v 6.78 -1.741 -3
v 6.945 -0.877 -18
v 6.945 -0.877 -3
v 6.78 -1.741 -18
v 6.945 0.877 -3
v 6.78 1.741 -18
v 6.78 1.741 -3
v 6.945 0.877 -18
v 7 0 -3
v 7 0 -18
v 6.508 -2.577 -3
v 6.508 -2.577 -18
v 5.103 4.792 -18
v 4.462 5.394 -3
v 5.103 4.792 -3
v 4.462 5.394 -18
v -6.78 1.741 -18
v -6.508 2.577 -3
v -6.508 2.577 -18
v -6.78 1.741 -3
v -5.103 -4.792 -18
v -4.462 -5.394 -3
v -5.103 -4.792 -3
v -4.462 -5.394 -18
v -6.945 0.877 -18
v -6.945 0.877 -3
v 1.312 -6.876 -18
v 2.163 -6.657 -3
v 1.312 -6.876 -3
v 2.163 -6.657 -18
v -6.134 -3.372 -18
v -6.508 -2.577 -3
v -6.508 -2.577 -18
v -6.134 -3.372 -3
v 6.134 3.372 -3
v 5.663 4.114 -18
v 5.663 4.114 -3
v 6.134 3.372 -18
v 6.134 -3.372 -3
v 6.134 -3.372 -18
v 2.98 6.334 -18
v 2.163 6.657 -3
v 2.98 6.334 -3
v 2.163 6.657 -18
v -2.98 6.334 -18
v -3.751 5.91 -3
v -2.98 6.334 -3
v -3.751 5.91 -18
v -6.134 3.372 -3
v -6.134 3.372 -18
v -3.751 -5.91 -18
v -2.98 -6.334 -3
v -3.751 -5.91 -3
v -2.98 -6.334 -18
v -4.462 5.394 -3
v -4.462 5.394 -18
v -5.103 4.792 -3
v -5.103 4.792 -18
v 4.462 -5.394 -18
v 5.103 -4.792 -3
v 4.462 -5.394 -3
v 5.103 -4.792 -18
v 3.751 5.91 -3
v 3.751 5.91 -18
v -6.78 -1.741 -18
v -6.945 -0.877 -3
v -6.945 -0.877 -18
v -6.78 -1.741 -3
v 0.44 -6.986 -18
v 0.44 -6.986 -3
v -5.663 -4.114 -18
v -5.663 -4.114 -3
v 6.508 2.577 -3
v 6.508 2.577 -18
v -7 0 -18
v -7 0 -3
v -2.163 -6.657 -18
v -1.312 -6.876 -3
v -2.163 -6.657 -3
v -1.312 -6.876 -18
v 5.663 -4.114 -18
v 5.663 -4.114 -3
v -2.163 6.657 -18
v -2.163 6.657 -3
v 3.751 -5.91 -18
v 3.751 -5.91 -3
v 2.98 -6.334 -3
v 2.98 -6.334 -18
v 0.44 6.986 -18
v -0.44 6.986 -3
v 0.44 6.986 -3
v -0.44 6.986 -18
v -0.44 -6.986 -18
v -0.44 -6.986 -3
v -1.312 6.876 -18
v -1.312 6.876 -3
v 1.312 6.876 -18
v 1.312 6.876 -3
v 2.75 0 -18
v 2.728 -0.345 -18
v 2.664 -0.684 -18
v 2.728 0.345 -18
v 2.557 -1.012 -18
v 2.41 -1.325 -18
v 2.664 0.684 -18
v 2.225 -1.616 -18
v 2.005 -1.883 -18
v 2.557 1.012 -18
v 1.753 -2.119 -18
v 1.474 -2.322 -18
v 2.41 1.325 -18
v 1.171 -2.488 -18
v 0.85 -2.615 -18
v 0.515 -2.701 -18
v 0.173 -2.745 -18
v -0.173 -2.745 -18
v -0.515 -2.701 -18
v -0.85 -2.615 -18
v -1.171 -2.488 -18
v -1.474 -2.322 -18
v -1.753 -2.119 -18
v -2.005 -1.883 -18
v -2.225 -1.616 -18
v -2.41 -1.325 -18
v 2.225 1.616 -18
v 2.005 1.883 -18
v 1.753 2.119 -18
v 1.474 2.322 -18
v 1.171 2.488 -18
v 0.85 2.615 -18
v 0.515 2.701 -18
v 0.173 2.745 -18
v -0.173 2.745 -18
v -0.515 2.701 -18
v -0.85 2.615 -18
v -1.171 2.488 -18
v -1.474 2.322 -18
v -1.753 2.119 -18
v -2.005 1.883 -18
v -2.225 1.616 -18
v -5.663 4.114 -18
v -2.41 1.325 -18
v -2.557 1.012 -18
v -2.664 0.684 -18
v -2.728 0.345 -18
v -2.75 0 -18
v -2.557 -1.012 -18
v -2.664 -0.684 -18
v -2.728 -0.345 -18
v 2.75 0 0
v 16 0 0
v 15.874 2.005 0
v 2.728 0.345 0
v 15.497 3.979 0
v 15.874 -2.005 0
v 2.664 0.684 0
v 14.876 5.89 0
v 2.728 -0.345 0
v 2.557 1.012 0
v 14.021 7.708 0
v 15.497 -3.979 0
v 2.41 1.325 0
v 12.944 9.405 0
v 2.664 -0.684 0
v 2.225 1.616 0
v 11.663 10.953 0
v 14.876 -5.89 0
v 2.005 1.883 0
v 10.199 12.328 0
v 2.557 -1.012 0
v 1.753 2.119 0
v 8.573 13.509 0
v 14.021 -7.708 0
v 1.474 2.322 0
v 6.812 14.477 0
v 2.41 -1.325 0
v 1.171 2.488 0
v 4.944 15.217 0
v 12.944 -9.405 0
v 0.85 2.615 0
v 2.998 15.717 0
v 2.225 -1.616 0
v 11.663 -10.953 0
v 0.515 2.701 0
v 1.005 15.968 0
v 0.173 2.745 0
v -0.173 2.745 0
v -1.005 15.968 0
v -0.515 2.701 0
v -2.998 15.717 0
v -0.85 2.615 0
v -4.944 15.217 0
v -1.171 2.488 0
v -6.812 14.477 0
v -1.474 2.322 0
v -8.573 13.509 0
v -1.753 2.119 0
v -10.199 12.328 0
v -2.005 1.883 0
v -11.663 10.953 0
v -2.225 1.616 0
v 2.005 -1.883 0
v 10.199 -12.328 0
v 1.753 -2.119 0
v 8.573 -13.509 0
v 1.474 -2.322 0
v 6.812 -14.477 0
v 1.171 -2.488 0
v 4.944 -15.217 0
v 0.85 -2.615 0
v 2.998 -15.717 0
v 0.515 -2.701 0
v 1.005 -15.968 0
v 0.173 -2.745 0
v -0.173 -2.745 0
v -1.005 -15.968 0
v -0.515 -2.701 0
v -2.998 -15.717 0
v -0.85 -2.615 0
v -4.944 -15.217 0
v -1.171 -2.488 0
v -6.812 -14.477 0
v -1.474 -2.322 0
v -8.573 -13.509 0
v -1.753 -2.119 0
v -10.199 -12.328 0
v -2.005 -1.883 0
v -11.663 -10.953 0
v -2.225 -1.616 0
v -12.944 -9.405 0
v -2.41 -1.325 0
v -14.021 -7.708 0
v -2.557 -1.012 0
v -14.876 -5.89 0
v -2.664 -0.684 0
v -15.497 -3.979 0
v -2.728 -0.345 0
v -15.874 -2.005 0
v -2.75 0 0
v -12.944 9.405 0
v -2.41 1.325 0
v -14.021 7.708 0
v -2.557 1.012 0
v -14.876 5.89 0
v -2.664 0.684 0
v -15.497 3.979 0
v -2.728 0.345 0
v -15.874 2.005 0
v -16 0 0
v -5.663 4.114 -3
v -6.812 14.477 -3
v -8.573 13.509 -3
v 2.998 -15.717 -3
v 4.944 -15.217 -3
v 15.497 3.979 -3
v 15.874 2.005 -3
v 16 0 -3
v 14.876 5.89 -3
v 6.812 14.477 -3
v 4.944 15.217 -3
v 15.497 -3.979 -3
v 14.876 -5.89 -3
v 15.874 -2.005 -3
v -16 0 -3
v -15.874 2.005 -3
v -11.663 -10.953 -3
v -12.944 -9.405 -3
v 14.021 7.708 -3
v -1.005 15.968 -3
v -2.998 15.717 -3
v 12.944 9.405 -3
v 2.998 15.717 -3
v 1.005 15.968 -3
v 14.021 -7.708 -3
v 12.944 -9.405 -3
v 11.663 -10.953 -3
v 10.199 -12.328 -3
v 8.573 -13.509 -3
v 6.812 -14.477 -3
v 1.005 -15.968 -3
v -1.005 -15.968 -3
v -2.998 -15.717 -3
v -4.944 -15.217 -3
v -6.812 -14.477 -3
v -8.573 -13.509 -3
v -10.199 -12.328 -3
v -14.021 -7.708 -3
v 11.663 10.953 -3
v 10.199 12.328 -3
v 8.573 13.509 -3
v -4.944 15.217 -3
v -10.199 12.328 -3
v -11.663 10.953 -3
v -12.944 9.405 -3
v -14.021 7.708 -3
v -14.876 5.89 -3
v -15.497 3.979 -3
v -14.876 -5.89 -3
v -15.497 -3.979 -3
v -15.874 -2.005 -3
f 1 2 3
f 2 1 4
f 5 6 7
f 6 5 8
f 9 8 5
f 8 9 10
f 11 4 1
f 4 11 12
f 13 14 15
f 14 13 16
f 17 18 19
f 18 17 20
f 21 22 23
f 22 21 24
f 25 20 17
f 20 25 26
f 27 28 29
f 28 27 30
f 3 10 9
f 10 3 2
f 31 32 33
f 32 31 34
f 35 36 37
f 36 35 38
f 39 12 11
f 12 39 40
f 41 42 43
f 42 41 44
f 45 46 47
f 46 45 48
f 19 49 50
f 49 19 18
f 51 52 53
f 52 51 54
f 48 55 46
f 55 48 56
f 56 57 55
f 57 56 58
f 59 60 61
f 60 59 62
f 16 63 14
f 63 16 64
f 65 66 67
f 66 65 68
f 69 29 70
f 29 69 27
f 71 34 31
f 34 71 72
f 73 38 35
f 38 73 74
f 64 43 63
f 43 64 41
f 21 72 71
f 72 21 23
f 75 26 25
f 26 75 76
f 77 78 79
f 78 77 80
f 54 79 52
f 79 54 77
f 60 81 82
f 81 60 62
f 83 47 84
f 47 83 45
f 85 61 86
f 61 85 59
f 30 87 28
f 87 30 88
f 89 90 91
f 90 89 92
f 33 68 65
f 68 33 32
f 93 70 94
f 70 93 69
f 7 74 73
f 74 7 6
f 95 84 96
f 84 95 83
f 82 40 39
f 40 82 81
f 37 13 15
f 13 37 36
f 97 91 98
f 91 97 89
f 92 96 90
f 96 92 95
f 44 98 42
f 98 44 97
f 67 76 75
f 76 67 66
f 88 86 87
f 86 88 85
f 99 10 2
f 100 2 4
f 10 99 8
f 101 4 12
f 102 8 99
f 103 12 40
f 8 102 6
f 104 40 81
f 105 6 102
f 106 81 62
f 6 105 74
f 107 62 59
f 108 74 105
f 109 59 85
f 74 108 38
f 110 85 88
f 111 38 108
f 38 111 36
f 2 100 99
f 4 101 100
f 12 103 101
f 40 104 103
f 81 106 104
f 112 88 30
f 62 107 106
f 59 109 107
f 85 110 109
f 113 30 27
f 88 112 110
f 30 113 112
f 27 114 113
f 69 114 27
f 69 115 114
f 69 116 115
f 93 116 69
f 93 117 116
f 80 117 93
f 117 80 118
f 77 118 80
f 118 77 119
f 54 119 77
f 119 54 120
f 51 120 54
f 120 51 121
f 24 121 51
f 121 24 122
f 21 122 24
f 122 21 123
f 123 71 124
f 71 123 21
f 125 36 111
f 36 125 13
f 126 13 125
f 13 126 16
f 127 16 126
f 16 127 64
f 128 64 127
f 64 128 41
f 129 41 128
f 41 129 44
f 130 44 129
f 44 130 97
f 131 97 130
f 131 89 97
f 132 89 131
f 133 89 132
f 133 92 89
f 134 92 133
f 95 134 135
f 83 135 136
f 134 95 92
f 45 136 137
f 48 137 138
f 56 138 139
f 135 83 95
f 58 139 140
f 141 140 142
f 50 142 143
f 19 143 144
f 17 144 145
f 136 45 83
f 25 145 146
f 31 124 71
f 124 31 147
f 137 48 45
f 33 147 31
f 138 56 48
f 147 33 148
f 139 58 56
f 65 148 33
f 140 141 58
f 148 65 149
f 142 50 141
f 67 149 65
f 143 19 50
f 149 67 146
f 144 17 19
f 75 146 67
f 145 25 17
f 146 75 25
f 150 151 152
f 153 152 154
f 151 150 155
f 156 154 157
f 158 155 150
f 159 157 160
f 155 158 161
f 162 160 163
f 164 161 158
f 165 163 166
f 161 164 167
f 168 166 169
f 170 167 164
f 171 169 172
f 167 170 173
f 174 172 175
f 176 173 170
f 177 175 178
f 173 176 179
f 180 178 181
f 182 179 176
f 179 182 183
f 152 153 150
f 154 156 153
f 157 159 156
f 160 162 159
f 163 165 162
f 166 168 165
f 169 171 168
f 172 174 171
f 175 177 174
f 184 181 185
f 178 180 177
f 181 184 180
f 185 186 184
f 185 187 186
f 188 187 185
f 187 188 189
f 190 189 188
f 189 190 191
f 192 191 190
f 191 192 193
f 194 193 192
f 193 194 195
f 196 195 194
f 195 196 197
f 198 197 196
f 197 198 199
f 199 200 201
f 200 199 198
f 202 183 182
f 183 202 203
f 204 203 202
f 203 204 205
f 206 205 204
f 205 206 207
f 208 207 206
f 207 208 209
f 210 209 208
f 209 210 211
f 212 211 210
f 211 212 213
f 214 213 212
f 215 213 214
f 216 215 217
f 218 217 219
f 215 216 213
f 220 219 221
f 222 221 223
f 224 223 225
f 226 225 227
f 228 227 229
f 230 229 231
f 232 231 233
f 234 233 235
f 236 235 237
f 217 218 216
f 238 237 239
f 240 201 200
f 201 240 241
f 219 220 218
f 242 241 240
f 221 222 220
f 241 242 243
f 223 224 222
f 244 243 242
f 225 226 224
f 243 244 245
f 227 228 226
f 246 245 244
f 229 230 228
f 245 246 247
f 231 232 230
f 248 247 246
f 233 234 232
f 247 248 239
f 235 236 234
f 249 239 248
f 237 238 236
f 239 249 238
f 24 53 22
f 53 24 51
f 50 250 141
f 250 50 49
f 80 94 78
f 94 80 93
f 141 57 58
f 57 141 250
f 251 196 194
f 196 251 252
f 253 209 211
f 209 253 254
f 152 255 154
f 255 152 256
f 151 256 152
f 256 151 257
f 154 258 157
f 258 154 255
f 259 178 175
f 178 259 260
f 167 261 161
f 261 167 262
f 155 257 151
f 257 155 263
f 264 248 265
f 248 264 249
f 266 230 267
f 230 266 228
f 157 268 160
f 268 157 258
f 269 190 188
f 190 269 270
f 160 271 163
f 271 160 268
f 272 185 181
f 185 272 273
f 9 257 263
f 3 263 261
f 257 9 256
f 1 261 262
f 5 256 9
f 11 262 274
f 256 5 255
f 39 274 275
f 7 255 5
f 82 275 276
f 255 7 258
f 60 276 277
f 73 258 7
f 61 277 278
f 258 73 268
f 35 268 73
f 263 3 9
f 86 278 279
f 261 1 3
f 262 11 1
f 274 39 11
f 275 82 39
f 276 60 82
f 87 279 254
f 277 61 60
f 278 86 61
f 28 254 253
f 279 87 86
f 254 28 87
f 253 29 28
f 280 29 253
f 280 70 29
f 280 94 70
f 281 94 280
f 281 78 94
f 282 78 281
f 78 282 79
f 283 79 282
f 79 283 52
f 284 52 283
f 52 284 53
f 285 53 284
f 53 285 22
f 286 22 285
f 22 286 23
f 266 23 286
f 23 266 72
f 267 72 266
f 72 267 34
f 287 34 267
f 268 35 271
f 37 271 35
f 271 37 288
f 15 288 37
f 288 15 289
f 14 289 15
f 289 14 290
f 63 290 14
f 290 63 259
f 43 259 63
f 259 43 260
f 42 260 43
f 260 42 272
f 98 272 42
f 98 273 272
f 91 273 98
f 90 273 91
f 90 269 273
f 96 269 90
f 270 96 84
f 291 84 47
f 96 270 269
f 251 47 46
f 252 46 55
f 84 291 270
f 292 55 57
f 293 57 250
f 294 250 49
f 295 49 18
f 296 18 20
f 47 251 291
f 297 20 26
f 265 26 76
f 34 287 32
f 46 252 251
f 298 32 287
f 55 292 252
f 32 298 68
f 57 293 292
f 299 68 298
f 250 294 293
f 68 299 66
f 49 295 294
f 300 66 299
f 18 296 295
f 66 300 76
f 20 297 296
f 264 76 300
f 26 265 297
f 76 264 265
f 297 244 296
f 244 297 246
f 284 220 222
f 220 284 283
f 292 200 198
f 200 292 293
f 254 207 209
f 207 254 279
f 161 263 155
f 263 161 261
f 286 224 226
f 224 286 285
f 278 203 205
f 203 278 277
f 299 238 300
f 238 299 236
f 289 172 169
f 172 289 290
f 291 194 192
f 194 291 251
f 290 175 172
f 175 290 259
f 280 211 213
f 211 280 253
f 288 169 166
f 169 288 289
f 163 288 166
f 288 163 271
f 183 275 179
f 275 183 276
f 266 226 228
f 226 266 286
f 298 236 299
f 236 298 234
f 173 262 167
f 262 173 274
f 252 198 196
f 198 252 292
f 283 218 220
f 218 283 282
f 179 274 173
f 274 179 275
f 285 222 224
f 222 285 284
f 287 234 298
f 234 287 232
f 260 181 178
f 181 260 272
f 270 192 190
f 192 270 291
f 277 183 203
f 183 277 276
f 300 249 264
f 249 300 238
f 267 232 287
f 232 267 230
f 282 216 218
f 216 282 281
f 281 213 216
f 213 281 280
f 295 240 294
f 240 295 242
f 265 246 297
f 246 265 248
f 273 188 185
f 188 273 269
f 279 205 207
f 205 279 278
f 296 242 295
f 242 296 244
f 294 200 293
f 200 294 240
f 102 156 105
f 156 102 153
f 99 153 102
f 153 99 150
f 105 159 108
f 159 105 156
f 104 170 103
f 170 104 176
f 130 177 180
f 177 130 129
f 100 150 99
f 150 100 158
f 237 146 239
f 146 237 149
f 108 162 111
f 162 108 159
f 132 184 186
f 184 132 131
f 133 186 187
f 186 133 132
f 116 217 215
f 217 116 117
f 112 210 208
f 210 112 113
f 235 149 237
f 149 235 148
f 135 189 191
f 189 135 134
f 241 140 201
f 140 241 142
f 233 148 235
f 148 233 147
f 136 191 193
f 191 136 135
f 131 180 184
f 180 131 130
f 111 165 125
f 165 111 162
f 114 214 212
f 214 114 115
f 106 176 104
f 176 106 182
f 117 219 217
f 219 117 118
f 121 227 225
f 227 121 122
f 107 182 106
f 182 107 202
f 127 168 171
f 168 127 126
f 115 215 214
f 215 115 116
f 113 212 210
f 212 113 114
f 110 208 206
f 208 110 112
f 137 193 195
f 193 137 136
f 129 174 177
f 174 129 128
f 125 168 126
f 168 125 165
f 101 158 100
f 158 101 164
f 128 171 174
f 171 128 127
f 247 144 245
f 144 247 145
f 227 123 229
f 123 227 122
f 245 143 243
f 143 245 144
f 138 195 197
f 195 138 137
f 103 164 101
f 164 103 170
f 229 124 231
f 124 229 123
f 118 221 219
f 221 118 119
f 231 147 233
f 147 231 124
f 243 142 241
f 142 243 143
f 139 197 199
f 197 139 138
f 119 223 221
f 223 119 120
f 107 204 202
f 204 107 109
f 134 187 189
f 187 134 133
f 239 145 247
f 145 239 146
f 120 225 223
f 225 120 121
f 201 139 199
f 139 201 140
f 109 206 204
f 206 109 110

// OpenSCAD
$fn = 50;


difference() {
	union() {
		translate(v = [0, 0, -18.0000000000]) {
			cylinder(h = 18, r = 7.0000000000);
		}
		translate(v = [0, 0, -3.0000000000]) {
			cylinder(h = 3, r = 16.0000000000);
		}
	}
	union() {
		#translate(v = [0, 0, -18]) {
			cylinder(h = 18, r = 2.7500000000);
		}
	}
}
